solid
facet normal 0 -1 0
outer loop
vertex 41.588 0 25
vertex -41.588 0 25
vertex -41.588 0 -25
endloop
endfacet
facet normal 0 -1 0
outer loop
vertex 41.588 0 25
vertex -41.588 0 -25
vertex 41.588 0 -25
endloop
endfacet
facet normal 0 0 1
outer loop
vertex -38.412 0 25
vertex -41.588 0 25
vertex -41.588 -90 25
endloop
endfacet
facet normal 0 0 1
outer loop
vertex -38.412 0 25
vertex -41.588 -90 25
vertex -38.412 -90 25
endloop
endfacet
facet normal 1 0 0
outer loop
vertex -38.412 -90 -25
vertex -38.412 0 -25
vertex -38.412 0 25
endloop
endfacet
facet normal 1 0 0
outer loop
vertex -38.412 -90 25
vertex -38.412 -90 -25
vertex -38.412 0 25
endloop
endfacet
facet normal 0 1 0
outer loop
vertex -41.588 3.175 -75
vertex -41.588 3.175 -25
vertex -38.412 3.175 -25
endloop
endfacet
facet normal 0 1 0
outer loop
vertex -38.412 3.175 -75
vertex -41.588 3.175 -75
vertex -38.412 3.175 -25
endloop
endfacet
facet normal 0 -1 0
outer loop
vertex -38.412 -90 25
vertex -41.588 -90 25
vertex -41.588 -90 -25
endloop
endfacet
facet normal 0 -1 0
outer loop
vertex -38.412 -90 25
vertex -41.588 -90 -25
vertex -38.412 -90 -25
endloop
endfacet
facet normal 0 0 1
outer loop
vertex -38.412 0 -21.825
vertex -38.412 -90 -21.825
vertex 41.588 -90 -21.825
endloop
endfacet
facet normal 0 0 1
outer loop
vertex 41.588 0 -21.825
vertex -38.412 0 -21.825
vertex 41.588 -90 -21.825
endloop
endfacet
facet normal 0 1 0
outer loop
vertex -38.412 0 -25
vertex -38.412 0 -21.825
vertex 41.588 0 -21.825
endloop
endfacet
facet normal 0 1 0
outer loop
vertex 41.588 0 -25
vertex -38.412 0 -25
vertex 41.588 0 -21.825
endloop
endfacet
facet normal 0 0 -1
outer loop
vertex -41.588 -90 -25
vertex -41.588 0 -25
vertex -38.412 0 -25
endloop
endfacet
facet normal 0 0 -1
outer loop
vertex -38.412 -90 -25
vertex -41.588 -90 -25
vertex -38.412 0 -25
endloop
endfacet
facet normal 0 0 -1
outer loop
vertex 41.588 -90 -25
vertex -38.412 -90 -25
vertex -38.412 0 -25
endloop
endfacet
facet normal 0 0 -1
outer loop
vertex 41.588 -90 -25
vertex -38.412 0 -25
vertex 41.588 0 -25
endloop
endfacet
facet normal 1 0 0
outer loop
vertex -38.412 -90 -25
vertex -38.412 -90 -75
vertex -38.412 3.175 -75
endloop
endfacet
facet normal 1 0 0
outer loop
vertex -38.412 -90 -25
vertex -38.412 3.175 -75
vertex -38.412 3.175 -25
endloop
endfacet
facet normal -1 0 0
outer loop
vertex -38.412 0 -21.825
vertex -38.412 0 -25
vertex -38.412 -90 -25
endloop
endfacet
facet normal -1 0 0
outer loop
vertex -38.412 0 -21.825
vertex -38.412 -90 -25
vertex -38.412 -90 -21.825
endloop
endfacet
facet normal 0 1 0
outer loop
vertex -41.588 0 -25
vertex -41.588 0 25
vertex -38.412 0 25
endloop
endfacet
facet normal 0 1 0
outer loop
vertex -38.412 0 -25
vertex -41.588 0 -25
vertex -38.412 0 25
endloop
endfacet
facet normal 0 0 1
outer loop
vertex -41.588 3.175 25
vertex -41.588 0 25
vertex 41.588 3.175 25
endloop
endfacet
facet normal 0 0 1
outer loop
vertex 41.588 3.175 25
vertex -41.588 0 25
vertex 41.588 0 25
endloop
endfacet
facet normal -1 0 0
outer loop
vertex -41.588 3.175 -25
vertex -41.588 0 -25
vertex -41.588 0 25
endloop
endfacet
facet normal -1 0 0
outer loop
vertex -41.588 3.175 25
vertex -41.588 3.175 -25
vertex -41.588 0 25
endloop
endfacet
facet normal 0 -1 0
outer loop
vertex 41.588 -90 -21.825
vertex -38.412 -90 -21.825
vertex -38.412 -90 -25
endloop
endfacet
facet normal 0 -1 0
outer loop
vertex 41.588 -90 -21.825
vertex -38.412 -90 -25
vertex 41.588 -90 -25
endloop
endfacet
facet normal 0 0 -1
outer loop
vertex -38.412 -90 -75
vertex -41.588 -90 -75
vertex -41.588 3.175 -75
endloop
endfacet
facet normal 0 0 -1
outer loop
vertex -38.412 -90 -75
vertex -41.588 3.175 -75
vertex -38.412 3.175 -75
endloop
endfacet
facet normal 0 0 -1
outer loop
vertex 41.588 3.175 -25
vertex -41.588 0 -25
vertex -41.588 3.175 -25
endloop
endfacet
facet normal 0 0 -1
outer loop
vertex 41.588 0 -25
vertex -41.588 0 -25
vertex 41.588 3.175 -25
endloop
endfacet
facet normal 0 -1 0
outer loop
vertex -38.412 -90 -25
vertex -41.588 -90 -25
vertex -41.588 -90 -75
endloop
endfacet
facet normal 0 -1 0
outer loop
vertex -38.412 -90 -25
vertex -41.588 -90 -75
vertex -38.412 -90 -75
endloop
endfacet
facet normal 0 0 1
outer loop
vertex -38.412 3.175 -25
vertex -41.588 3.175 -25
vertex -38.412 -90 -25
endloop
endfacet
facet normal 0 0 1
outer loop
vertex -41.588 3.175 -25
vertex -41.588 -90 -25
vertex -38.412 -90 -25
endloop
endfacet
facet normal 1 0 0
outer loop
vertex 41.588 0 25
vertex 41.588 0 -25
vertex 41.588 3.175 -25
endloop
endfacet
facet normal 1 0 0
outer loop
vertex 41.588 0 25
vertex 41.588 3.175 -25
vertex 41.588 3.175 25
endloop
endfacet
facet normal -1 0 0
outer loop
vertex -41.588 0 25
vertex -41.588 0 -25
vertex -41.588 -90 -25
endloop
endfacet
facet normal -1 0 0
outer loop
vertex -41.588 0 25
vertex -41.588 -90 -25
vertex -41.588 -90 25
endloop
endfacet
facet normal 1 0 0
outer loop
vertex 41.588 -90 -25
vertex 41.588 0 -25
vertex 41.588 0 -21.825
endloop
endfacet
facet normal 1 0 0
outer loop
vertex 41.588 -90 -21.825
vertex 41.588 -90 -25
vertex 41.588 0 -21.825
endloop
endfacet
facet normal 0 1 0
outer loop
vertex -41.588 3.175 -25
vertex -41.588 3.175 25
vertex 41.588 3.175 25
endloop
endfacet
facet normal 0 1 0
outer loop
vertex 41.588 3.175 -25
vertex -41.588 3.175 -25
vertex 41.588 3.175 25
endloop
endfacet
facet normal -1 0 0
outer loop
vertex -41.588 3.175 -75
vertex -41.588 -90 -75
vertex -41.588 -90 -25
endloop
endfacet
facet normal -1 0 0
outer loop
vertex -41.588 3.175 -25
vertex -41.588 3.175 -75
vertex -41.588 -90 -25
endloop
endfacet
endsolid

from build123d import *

# Parameters (mm, degrees)
F0_W           = 83.175
F0_H           = 50
F1_DEPTH       = 3.175
F2_W           = 3.175
F2_H           = 50
F3_DEPTH       = 90
F4_W           = 3.175
F4_H           = 50
F5_DEPTH       = 80
F6_W           = 80
F6_H           = 3.175
F7_DEPTH       = 90
F8_W           = 80
F8_H           = 3.175
F9_DEPTH       = 80
F10_W          = 3.175
F10_H          = 50
F11_DEPTH      = 90
F11_DEPTH_BACK = 3.175
F12_R          = 2.5
F13_DEPTH      = 3.175


# Not quite as in the source:
# - a length typed as a fraction of an inch, garbled in the dataset ("3 / 203.2 mm" for 3/8 in), is restored
# - a feature names something its author has since deleted; it is built from what else it names


with BuildPart() as f1:
    # F0 (on Front) → F1 (new body)
    with BuildSketch(Plane.XZ):
        Rectangle(F0_W, F0_H)
    extrude(amount=-F1_DEPTH)


with BuildPart() as f3:
    # F2 (on Front) → F3 (new body)
    with BuildSketch(Plane.XZ):
        with Locations((-40, 0)):
            Rectangle(F2_W, F2_H)
    extrude(amount=F3_DEPTH)


with BuildPart() as f5:
    # F4 (on Front) → F5 (new body)
    with BuildSketch(Plane.XZ):
        with Locations((40, 0)):
            Rectangle(F4_W, F4_H)
    extrude(amount=F5_DEPTH)

    # F12 (on face) → F13 (cut, through all)
    with BuildSketch(Plane.YZ.offset(41.5875)):
        with Locations((-40, -15)):
            Circle(F12_R)
    extrude(amount=-F13_DEPTH, mode=Mode.SUBTRACT)


with BuildPart() as f7:
    # F6 (on Front) → F7 (new body)
    with BuildSketch(Plane.XZ):
        with Locations((1.5875, -23.4125)):
            Rectangle(F6_W, F6_H)
    extrude(amount=F7_DEPTH)


with BuildPart() as f9:
    # F8 (on Front) → F9 (new body)
    with BuildSketch(Plane.XZ):
        with Locations((1.5875, 23.4125)):
            Rectangle(F8_W, F8_H)
    extrude(amount=F9_DEPTH)


with BuildPart() as f11:
    # F10 (on Front) → F11 (new body, two sides)
    with BuildSketch(Plane.XZ) as f11_sk:
        with Locations((-40, -50)):
            Rectangle(F10_W, F10_H)
    extrude(amount=F11_DEPTH)
    extrude(f11_sk.sketch, amount=-F11_DEPTH_BACK)


solid = Compound([f1.part, f3.part, f7.part, f11.part])
